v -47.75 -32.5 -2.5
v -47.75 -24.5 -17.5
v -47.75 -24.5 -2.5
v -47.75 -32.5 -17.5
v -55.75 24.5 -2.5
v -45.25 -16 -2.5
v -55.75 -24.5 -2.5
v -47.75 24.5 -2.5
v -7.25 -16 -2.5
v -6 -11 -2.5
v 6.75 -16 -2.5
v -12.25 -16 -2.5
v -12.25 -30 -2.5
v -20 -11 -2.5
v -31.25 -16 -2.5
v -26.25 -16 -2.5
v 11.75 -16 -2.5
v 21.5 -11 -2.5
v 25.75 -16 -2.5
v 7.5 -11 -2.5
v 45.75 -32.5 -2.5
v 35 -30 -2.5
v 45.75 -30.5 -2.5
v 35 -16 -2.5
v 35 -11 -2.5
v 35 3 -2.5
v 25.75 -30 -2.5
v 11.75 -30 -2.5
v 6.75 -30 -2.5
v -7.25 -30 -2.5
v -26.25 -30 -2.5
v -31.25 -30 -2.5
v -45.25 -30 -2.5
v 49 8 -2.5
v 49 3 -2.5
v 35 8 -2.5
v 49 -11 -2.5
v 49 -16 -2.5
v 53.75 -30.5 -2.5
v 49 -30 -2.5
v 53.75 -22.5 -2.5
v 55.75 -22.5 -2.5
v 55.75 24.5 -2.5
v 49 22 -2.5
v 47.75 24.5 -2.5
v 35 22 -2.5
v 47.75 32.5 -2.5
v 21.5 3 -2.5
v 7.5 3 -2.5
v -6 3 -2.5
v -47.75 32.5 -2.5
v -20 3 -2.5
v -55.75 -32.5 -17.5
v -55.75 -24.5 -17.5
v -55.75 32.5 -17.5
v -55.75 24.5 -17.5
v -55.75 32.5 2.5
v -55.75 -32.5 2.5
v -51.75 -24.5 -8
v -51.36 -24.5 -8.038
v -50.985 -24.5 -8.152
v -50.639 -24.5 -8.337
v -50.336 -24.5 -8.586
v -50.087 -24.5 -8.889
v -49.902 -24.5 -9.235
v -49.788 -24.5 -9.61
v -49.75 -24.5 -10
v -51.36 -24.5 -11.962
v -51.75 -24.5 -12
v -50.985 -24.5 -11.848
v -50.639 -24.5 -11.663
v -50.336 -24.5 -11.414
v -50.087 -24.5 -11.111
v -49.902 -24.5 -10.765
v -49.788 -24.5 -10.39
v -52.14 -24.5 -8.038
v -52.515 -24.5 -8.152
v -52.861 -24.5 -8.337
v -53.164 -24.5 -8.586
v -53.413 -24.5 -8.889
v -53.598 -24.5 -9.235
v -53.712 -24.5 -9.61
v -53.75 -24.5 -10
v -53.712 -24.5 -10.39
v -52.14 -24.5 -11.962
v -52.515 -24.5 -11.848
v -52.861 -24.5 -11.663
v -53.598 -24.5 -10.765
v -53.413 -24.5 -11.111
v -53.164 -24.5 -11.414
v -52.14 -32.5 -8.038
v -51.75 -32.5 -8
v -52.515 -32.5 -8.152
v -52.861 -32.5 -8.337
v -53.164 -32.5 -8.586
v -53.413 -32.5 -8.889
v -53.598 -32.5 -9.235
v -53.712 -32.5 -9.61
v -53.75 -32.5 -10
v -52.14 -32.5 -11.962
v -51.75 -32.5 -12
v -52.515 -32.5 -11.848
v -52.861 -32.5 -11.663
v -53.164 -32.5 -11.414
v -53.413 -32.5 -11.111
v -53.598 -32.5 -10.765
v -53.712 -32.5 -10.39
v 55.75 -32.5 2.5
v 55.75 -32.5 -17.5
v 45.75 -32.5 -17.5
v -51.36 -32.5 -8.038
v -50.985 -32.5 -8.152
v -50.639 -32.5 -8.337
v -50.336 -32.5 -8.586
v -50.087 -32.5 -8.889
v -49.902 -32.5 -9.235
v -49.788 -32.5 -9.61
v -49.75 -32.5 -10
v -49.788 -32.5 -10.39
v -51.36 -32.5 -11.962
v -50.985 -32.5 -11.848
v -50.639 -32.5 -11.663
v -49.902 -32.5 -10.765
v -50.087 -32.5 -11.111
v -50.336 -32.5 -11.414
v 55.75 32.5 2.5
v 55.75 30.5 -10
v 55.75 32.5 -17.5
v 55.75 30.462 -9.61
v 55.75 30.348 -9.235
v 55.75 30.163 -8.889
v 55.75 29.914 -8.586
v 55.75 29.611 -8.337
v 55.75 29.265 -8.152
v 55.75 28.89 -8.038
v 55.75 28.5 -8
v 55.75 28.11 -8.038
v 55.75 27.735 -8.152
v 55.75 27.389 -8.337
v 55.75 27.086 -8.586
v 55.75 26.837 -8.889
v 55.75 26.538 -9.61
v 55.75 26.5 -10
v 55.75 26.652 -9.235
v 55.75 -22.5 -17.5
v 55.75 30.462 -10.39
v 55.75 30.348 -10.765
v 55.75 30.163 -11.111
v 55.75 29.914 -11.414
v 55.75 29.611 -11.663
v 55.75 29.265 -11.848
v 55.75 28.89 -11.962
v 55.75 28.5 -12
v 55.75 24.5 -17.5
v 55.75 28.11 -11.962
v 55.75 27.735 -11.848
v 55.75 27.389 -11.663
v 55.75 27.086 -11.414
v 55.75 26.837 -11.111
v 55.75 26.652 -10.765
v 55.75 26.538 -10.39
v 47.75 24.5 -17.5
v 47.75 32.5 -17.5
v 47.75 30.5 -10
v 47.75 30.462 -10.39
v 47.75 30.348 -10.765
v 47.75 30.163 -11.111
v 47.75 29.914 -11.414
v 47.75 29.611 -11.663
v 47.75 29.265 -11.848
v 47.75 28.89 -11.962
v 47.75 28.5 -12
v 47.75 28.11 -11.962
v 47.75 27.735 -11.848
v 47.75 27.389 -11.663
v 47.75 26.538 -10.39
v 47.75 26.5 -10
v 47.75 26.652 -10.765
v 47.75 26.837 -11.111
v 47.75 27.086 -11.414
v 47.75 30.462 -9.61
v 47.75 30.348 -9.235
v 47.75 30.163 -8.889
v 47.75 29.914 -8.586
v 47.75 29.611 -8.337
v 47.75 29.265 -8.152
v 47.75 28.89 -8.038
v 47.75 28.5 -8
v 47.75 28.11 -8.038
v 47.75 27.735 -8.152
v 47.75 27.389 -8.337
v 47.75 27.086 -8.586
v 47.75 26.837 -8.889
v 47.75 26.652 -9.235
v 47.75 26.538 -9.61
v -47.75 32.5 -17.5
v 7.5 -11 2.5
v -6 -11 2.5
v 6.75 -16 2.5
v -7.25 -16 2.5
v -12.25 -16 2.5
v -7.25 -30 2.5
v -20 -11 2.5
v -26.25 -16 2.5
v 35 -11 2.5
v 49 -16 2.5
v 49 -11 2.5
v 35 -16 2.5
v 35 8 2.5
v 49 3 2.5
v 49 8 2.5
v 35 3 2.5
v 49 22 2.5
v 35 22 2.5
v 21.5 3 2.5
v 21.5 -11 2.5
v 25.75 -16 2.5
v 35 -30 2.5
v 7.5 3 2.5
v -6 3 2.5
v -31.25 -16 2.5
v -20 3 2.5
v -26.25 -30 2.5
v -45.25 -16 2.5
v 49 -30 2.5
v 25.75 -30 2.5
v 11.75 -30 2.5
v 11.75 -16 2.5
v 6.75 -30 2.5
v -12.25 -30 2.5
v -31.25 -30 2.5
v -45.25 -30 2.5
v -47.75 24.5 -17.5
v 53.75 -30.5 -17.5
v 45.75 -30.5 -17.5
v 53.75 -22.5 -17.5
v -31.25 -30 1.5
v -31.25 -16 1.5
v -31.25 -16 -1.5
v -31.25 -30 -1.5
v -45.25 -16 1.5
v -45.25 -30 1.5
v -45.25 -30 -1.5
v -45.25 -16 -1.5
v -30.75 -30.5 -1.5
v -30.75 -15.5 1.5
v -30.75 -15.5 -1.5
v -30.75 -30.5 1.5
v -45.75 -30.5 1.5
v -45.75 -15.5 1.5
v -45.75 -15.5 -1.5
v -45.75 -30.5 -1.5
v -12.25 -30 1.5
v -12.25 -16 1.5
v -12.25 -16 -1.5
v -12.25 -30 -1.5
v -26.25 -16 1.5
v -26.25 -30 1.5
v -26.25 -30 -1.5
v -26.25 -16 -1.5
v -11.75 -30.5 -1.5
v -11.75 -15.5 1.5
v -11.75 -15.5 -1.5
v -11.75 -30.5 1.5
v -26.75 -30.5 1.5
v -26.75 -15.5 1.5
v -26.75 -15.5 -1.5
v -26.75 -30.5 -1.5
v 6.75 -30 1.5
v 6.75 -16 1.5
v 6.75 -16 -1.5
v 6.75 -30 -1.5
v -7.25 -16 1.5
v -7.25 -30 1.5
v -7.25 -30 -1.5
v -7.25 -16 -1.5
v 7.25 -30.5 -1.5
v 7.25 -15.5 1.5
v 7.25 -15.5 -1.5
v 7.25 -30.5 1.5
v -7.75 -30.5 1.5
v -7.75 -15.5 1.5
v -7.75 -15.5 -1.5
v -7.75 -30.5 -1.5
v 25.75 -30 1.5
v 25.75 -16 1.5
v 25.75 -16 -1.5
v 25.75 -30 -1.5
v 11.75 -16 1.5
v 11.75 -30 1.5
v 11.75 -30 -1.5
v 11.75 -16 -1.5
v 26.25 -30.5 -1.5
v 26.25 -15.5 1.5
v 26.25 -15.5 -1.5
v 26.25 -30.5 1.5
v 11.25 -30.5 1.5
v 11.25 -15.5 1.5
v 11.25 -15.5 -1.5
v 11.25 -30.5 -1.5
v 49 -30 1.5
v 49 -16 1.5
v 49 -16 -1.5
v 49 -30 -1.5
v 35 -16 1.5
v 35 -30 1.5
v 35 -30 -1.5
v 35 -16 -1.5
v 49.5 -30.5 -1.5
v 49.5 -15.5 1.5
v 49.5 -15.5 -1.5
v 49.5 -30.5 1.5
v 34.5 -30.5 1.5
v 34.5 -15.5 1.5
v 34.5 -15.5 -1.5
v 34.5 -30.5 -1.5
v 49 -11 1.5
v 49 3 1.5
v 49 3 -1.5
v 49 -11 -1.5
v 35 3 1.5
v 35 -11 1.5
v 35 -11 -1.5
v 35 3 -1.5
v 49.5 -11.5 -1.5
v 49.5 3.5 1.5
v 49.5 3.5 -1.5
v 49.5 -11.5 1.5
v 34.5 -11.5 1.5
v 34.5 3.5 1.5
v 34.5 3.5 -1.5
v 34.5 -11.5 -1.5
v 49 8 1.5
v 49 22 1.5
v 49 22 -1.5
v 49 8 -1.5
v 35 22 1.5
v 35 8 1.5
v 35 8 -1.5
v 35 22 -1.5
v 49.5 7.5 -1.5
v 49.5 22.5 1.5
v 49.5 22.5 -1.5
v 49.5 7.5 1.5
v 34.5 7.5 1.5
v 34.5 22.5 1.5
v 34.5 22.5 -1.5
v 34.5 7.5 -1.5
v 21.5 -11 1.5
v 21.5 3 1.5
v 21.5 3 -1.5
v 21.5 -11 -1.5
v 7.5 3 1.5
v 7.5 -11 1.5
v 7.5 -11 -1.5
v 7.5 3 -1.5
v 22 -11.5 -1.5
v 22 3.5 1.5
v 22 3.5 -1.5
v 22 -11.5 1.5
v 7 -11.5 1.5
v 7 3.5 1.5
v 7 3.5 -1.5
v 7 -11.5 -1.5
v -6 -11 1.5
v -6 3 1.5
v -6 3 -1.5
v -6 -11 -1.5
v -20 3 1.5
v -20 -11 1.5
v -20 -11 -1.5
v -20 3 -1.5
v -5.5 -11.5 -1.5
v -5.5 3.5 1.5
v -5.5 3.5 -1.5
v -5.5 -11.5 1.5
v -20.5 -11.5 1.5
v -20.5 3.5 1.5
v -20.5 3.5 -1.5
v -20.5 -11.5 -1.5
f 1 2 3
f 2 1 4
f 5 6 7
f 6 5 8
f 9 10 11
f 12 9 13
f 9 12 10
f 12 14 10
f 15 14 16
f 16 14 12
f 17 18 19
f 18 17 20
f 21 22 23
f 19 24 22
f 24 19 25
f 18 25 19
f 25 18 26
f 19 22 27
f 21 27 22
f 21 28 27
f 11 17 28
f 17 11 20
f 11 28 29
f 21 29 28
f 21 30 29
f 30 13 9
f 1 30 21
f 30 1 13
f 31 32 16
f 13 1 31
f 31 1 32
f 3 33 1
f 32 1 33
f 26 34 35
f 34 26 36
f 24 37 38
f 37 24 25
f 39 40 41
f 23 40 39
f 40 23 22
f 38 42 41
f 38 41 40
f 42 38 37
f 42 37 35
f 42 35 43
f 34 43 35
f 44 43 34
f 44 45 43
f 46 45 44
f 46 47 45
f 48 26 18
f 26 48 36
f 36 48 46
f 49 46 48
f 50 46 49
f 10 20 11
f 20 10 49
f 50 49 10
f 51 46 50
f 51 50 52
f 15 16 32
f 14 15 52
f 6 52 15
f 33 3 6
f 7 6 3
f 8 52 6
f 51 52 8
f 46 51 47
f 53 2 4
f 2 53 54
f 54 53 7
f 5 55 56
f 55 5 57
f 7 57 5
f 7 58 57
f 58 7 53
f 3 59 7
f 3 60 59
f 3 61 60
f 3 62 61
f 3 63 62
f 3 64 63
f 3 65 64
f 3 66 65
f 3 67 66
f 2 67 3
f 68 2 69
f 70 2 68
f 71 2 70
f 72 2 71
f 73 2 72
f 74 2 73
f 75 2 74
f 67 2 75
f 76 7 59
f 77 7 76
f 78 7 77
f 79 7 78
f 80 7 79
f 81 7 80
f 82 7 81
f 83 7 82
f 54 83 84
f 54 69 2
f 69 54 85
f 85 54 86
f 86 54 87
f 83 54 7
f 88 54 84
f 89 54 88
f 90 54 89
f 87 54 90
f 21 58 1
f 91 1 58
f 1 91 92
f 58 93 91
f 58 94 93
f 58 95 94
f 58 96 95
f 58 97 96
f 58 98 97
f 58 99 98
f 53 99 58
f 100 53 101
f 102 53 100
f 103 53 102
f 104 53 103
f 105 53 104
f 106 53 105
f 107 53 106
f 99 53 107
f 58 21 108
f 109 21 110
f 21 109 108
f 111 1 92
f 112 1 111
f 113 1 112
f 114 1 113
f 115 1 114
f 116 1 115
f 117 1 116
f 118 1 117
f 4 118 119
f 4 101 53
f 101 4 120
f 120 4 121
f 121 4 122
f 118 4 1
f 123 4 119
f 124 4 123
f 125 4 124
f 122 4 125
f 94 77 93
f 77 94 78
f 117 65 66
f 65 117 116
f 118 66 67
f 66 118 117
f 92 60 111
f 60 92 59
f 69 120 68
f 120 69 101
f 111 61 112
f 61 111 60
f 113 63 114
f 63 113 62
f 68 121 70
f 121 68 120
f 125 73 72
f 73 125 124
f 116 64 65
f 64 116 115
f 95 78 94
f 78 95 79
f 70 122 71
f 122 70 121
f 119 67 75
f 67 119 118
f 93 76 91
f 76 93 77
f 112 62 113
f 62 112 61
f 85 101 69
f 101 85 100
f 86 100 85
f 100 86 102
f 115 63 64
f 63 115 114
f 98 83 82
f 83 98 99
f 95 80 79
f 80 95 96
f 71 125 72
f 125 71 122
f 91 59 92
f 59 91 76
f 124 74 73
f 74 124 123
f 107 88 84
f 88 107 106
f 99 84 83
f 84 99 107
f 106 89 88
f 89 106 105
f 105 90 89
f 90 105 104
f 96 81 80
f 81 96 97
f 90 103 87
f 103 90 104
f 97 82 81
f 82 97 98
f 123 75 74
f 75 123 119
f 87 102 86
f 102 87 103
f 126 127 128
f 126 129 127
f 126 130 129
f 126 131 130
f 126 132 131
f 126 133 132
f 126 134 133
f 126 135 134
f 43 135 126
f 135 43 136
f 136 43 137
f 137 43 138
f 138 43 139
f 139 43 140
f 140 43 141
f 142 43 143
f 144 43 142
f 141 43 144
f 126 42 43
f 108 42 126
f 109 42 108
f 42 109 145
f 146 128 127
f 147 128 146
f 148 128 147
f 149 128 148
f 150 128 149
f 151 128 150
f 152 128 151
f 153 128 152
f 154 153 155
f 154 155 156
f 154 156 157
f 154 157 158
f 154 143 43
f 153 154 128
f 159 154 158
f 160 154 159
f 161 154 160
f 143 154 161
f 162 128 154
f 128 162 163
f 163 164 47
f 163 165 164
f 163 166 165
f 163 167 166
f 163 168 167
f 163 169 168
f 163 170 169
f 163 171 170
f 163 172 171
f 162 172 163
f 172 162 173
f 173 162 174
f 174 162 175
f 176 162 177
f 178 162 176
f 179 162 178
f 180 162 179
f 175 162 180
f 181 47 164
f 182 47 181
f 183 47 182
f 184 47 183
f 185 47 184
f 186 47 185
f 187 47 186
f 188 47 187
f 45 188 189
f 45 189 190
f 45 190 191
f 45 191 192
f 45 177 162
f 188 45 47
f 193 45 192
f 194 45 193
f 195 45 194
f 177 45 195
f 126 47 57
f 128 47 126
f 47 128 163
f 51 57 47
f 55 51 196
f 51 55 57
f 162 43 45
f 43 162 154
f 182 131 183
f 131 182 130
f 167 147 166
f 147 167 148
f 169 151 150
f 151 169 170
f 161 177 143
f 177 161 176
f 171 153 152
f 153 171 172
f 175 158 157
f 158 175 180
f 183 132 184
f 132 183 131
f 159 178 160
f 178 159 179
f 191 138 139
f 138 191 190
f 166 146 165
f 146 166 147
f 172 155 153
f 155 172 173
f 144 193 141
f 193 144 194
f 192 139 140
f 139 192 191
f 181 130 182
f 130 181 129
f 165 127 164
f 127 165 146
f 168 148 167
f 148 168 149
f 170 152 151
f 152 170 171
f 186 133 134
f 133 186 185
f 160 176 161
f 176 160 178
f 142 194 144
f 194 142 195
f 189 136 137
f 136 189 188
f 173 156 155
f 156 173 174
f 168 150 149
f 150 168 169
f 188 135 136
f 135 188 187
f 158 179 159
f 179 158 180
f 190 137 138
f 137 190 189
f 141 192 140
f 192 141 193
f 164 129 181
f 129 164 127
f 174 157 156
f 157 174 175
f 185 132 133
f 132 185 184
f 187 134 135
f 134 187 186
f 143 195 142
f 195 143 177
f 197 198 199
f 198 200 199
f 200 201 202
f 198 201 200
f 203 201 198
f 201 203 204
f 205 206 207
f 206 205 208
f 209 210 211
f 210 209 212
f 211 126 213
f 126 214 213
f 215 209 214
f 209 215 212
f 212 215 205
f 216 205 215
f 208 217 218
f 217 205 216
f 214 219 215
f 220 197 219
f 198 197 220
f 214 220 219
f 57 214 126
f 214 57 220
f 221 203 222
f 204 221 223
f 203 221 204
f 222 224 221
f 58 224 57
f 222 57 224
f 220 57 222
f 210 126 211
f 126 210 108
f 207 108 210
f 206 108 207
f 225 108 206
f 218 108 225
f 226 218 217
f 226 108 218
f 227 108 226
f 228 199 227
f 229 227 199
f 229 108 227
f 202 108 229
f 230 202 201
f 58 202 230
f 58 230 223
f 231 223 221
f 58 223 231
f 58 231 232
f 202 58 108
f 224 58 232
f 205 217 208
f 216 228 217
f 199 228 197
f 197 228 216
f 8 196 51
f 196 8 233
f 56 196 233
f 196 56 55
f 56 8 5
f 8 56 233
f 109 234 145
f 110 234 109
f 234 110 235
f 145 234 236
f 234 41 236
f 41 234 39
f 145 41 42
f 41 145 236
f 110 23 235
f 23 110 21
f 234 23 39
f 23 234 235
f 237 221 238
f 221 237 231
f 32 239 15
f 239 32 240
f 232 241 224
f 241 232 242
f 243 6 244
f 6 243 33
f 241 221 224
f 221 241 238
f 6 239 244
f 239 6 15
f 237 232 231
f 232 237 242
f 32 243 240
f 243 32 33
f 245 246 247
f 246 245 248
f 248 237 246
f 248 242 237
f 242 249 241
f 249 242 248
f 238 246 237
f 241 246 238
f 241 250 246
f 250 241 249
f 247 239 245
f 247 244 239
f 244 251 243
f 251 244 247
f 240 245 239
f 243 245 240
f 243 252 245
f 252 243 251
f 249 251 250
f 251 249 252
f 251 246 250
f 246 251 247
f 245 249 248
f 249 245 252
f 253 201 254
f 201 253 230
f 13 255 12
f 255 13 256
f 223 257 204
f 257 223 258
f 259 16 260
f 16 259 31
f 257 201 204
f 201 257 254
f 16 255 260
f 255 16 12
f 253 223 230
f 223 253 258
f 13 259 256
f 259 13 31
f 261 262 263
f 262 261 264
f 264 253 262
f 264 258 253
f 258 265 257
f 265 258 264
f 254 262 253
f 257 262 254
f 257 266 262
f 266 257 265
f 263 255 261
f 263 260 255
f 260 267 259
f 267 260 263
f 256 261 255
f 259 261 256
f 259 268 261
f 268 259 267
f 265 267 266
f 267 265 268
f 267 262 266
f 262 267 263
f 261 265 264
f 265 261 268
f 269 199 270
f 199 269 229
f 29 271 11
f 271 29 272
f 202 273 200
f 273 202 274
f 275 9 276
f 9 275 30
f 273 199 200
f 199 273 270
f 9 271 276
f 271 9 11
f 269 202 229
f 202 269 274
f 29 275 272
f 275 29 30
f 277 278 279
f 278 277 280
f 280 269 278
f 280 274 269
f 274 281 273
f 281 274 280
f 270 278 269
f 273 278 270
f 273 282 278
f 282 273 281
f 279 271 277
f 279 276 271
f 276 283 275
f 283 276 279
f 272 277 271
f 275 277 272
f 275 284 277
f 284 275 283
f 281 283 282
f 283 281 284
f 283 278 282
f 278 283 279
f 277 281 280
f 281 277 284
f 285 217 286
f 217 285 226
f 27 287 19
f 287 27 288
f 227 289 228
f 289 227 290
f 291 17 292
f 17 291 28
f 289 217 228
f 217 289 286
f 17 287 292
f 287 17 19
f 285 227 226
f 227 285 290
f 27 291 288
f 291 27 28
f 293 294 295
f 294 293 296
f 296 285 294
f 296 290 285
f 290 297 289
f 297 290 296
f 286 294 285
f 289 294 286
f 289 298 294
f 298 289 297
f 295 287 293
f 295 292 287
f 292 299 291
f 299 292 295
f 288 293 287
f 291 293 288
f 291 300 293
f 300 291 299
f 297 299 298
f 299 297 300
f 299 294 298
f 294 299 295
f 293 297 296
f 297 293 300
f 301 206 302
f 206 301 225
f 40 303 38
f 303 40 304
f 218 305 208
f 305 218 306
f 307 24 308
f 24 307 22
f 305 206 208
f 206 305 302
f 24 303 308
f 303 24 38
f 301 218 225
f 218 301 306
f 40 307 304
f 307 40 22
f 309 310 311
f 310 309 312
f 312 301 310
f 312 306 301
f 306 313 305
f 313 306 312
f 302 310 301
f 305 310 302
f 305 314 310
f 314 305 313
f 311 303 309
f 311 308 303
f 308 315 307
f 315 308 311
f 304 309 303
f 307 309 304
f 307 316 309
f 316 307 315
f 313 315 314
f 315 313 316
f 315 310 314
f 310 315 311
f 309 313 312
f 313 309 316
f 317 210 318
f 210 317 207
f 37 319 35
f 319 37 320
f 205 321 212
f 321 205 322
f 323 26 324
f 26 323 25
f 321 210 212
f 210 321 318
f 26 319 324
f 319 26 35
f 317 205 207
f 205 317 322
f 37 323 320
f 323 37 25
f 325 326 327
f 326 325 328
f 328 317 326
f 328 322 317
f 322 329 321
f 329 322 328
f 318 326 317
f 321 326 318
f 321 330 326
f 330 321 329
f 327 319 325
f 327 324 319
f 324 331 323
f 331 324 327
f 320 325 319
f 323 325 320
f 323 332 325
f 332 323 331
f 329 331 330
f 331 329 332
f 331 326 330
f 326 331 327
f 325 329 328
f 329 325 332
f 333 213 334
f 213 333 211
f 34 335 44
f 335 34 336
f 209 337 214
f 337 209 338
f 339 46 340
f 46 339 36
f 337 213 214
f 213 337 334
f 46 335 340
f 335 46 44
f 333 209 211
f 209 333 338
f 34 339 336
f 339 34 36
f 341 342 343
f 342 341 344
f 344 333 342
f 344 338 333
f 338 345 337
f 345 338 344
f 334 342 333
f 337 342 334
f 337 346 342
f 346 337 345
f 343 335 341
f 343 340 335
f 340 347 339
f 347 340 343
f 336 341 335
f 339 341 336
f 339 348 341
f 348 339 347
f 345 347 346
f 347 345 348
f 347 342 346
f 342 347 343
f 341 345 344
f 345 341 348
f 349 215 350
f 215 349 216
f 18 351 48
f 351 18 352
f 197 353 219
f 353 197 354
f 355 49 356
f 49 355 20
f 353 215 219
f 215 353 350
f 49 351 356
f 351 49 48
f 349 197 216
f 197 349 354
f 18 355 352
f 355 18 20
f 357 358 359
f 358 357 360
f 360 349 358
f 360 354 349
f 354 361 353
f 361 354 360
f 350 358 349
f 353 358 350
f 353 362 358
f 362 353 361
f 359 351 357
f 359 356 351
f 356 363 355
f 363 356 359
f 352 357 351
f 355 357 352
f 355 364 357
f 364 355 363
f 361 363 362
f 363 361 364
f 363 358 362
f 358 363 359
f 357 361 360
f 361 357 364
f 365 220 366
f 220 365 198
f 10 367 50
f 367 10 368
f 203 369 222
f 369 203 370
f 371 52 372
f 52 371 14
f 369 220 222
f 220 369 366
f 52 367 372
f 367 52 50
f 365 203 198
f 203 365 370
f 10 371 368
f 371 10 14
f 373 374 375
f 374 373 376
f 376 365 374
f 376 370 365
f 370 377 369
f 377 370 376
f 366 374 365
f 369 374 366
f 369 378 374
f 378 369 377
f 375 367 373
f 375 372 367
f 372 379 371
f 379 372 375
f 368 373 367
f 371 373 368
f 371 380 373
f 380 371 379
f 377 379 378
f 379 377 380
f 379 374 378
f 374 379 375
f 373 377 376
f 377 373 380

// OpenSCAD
// file: common.scad
key_size = 14;

b_post = 8;
m_post_s = 2;
m_post_l = 10;
post_z = 15;

plat_z = 5;

module keyhole(x, y) {
  translate([x, y, 0]) {
    cube([key_size, key_size, plat_z + 1], center = true);
    cube([key_size + 1, key_size + 1, plat_z -2], center = true);
  }
}

module e_post(x, y, z) {
  translate([x, y, -(plat_z + post_z)/2]) {
    cube([b_post, b_post, post_z], center = true);
  }
}

module e_post_i(x, y, r) {
  translate([x, y, -(plat_z + post_z)/2]) {
    difference() {
      cube([b_post, b_post, post_z], center = true);
      rotate(r) cylinder(h=b_post+1, r=2, center=true, $fn=32);
    }
  }
}

module e_post_x(x, y) {
  e_post_i(x, y, [0, 90, 0]);
}


module e_post_y(x, y) {
  e_post_i(x, y, [90, 0, 0]);
}

module i_post_x(x, y) {
  translate([x, y, -(plat_z + post_z)/2]) cube([m_post_l, m_post_s, post_z], center = true);
}

module i_post_y(x, y) {
  translate([x, y, -(plat_z + post_z)/2]) cube([m_post_s, m_post_l, post_z], center = true);
}
// file: parameters.scad
key_size = 14;
key_sep = 5;
m_key_sep = 13.5;
l_key_sep = 33;

border = 8;
b_post = 8;
m_post_s = 2;
m_post_l = 10;
post_z = 15;

key_cell = key_size + key_sep;
m_key_cell_x = key_size + m_key_sep;
l_key_cell_x = 2*key_cell;

plat_z = 5;
// main file
// Ortho Mega section 1: Top left corner.

include <parameters.scad>

plat_x = border + 4*key_cell + m_key_cell_x;
plat_y = border + 3*key_cell;

use <common.scad>

// TODO: holes for lights, if you want them

difference() {
  union() {
    cube([plat_x, plat_y, 5], center = true);
    e_post_y(-(plat_x-b_post)/2, -(plat_y-b_post)/2);
    e_post(-(plat_x-b_post)/2, (plat_y-b_post)/2);
    e_post_x((plat_x-b_post)/2, (plat_y-b_post)/2);

    i_post_y((plat_x - m_post_s)/2, -(plat_y - m_post_l)/2);
    i_post_x((plat_x - m_post_l)/2, -(plat_y - m_post_s)/2);
  }
  
  for (i = [0:3]) {
    keyhole(-plat_x/2 + border + key_cell/2 + i*key_cell, -plat_y/2 + key_cell/2);
  }  
  for (i = [0:2]) {
    keyhole(plat_x/2 - m_key_cell_x/2, -plat_y/2 + key_cell/2 + i*key_cell);
  } 
  keyhole(plat_x/2 - m_key_cell_x - m_key_cell_x/2, -plat_y/2 + key_cell + key_cell/2);
  keyhole(plat_x/2 - 2*m_key_cell_x - m_key_cell_x/2, -plat_y/2 + key_cell + key_cell/2);

}
